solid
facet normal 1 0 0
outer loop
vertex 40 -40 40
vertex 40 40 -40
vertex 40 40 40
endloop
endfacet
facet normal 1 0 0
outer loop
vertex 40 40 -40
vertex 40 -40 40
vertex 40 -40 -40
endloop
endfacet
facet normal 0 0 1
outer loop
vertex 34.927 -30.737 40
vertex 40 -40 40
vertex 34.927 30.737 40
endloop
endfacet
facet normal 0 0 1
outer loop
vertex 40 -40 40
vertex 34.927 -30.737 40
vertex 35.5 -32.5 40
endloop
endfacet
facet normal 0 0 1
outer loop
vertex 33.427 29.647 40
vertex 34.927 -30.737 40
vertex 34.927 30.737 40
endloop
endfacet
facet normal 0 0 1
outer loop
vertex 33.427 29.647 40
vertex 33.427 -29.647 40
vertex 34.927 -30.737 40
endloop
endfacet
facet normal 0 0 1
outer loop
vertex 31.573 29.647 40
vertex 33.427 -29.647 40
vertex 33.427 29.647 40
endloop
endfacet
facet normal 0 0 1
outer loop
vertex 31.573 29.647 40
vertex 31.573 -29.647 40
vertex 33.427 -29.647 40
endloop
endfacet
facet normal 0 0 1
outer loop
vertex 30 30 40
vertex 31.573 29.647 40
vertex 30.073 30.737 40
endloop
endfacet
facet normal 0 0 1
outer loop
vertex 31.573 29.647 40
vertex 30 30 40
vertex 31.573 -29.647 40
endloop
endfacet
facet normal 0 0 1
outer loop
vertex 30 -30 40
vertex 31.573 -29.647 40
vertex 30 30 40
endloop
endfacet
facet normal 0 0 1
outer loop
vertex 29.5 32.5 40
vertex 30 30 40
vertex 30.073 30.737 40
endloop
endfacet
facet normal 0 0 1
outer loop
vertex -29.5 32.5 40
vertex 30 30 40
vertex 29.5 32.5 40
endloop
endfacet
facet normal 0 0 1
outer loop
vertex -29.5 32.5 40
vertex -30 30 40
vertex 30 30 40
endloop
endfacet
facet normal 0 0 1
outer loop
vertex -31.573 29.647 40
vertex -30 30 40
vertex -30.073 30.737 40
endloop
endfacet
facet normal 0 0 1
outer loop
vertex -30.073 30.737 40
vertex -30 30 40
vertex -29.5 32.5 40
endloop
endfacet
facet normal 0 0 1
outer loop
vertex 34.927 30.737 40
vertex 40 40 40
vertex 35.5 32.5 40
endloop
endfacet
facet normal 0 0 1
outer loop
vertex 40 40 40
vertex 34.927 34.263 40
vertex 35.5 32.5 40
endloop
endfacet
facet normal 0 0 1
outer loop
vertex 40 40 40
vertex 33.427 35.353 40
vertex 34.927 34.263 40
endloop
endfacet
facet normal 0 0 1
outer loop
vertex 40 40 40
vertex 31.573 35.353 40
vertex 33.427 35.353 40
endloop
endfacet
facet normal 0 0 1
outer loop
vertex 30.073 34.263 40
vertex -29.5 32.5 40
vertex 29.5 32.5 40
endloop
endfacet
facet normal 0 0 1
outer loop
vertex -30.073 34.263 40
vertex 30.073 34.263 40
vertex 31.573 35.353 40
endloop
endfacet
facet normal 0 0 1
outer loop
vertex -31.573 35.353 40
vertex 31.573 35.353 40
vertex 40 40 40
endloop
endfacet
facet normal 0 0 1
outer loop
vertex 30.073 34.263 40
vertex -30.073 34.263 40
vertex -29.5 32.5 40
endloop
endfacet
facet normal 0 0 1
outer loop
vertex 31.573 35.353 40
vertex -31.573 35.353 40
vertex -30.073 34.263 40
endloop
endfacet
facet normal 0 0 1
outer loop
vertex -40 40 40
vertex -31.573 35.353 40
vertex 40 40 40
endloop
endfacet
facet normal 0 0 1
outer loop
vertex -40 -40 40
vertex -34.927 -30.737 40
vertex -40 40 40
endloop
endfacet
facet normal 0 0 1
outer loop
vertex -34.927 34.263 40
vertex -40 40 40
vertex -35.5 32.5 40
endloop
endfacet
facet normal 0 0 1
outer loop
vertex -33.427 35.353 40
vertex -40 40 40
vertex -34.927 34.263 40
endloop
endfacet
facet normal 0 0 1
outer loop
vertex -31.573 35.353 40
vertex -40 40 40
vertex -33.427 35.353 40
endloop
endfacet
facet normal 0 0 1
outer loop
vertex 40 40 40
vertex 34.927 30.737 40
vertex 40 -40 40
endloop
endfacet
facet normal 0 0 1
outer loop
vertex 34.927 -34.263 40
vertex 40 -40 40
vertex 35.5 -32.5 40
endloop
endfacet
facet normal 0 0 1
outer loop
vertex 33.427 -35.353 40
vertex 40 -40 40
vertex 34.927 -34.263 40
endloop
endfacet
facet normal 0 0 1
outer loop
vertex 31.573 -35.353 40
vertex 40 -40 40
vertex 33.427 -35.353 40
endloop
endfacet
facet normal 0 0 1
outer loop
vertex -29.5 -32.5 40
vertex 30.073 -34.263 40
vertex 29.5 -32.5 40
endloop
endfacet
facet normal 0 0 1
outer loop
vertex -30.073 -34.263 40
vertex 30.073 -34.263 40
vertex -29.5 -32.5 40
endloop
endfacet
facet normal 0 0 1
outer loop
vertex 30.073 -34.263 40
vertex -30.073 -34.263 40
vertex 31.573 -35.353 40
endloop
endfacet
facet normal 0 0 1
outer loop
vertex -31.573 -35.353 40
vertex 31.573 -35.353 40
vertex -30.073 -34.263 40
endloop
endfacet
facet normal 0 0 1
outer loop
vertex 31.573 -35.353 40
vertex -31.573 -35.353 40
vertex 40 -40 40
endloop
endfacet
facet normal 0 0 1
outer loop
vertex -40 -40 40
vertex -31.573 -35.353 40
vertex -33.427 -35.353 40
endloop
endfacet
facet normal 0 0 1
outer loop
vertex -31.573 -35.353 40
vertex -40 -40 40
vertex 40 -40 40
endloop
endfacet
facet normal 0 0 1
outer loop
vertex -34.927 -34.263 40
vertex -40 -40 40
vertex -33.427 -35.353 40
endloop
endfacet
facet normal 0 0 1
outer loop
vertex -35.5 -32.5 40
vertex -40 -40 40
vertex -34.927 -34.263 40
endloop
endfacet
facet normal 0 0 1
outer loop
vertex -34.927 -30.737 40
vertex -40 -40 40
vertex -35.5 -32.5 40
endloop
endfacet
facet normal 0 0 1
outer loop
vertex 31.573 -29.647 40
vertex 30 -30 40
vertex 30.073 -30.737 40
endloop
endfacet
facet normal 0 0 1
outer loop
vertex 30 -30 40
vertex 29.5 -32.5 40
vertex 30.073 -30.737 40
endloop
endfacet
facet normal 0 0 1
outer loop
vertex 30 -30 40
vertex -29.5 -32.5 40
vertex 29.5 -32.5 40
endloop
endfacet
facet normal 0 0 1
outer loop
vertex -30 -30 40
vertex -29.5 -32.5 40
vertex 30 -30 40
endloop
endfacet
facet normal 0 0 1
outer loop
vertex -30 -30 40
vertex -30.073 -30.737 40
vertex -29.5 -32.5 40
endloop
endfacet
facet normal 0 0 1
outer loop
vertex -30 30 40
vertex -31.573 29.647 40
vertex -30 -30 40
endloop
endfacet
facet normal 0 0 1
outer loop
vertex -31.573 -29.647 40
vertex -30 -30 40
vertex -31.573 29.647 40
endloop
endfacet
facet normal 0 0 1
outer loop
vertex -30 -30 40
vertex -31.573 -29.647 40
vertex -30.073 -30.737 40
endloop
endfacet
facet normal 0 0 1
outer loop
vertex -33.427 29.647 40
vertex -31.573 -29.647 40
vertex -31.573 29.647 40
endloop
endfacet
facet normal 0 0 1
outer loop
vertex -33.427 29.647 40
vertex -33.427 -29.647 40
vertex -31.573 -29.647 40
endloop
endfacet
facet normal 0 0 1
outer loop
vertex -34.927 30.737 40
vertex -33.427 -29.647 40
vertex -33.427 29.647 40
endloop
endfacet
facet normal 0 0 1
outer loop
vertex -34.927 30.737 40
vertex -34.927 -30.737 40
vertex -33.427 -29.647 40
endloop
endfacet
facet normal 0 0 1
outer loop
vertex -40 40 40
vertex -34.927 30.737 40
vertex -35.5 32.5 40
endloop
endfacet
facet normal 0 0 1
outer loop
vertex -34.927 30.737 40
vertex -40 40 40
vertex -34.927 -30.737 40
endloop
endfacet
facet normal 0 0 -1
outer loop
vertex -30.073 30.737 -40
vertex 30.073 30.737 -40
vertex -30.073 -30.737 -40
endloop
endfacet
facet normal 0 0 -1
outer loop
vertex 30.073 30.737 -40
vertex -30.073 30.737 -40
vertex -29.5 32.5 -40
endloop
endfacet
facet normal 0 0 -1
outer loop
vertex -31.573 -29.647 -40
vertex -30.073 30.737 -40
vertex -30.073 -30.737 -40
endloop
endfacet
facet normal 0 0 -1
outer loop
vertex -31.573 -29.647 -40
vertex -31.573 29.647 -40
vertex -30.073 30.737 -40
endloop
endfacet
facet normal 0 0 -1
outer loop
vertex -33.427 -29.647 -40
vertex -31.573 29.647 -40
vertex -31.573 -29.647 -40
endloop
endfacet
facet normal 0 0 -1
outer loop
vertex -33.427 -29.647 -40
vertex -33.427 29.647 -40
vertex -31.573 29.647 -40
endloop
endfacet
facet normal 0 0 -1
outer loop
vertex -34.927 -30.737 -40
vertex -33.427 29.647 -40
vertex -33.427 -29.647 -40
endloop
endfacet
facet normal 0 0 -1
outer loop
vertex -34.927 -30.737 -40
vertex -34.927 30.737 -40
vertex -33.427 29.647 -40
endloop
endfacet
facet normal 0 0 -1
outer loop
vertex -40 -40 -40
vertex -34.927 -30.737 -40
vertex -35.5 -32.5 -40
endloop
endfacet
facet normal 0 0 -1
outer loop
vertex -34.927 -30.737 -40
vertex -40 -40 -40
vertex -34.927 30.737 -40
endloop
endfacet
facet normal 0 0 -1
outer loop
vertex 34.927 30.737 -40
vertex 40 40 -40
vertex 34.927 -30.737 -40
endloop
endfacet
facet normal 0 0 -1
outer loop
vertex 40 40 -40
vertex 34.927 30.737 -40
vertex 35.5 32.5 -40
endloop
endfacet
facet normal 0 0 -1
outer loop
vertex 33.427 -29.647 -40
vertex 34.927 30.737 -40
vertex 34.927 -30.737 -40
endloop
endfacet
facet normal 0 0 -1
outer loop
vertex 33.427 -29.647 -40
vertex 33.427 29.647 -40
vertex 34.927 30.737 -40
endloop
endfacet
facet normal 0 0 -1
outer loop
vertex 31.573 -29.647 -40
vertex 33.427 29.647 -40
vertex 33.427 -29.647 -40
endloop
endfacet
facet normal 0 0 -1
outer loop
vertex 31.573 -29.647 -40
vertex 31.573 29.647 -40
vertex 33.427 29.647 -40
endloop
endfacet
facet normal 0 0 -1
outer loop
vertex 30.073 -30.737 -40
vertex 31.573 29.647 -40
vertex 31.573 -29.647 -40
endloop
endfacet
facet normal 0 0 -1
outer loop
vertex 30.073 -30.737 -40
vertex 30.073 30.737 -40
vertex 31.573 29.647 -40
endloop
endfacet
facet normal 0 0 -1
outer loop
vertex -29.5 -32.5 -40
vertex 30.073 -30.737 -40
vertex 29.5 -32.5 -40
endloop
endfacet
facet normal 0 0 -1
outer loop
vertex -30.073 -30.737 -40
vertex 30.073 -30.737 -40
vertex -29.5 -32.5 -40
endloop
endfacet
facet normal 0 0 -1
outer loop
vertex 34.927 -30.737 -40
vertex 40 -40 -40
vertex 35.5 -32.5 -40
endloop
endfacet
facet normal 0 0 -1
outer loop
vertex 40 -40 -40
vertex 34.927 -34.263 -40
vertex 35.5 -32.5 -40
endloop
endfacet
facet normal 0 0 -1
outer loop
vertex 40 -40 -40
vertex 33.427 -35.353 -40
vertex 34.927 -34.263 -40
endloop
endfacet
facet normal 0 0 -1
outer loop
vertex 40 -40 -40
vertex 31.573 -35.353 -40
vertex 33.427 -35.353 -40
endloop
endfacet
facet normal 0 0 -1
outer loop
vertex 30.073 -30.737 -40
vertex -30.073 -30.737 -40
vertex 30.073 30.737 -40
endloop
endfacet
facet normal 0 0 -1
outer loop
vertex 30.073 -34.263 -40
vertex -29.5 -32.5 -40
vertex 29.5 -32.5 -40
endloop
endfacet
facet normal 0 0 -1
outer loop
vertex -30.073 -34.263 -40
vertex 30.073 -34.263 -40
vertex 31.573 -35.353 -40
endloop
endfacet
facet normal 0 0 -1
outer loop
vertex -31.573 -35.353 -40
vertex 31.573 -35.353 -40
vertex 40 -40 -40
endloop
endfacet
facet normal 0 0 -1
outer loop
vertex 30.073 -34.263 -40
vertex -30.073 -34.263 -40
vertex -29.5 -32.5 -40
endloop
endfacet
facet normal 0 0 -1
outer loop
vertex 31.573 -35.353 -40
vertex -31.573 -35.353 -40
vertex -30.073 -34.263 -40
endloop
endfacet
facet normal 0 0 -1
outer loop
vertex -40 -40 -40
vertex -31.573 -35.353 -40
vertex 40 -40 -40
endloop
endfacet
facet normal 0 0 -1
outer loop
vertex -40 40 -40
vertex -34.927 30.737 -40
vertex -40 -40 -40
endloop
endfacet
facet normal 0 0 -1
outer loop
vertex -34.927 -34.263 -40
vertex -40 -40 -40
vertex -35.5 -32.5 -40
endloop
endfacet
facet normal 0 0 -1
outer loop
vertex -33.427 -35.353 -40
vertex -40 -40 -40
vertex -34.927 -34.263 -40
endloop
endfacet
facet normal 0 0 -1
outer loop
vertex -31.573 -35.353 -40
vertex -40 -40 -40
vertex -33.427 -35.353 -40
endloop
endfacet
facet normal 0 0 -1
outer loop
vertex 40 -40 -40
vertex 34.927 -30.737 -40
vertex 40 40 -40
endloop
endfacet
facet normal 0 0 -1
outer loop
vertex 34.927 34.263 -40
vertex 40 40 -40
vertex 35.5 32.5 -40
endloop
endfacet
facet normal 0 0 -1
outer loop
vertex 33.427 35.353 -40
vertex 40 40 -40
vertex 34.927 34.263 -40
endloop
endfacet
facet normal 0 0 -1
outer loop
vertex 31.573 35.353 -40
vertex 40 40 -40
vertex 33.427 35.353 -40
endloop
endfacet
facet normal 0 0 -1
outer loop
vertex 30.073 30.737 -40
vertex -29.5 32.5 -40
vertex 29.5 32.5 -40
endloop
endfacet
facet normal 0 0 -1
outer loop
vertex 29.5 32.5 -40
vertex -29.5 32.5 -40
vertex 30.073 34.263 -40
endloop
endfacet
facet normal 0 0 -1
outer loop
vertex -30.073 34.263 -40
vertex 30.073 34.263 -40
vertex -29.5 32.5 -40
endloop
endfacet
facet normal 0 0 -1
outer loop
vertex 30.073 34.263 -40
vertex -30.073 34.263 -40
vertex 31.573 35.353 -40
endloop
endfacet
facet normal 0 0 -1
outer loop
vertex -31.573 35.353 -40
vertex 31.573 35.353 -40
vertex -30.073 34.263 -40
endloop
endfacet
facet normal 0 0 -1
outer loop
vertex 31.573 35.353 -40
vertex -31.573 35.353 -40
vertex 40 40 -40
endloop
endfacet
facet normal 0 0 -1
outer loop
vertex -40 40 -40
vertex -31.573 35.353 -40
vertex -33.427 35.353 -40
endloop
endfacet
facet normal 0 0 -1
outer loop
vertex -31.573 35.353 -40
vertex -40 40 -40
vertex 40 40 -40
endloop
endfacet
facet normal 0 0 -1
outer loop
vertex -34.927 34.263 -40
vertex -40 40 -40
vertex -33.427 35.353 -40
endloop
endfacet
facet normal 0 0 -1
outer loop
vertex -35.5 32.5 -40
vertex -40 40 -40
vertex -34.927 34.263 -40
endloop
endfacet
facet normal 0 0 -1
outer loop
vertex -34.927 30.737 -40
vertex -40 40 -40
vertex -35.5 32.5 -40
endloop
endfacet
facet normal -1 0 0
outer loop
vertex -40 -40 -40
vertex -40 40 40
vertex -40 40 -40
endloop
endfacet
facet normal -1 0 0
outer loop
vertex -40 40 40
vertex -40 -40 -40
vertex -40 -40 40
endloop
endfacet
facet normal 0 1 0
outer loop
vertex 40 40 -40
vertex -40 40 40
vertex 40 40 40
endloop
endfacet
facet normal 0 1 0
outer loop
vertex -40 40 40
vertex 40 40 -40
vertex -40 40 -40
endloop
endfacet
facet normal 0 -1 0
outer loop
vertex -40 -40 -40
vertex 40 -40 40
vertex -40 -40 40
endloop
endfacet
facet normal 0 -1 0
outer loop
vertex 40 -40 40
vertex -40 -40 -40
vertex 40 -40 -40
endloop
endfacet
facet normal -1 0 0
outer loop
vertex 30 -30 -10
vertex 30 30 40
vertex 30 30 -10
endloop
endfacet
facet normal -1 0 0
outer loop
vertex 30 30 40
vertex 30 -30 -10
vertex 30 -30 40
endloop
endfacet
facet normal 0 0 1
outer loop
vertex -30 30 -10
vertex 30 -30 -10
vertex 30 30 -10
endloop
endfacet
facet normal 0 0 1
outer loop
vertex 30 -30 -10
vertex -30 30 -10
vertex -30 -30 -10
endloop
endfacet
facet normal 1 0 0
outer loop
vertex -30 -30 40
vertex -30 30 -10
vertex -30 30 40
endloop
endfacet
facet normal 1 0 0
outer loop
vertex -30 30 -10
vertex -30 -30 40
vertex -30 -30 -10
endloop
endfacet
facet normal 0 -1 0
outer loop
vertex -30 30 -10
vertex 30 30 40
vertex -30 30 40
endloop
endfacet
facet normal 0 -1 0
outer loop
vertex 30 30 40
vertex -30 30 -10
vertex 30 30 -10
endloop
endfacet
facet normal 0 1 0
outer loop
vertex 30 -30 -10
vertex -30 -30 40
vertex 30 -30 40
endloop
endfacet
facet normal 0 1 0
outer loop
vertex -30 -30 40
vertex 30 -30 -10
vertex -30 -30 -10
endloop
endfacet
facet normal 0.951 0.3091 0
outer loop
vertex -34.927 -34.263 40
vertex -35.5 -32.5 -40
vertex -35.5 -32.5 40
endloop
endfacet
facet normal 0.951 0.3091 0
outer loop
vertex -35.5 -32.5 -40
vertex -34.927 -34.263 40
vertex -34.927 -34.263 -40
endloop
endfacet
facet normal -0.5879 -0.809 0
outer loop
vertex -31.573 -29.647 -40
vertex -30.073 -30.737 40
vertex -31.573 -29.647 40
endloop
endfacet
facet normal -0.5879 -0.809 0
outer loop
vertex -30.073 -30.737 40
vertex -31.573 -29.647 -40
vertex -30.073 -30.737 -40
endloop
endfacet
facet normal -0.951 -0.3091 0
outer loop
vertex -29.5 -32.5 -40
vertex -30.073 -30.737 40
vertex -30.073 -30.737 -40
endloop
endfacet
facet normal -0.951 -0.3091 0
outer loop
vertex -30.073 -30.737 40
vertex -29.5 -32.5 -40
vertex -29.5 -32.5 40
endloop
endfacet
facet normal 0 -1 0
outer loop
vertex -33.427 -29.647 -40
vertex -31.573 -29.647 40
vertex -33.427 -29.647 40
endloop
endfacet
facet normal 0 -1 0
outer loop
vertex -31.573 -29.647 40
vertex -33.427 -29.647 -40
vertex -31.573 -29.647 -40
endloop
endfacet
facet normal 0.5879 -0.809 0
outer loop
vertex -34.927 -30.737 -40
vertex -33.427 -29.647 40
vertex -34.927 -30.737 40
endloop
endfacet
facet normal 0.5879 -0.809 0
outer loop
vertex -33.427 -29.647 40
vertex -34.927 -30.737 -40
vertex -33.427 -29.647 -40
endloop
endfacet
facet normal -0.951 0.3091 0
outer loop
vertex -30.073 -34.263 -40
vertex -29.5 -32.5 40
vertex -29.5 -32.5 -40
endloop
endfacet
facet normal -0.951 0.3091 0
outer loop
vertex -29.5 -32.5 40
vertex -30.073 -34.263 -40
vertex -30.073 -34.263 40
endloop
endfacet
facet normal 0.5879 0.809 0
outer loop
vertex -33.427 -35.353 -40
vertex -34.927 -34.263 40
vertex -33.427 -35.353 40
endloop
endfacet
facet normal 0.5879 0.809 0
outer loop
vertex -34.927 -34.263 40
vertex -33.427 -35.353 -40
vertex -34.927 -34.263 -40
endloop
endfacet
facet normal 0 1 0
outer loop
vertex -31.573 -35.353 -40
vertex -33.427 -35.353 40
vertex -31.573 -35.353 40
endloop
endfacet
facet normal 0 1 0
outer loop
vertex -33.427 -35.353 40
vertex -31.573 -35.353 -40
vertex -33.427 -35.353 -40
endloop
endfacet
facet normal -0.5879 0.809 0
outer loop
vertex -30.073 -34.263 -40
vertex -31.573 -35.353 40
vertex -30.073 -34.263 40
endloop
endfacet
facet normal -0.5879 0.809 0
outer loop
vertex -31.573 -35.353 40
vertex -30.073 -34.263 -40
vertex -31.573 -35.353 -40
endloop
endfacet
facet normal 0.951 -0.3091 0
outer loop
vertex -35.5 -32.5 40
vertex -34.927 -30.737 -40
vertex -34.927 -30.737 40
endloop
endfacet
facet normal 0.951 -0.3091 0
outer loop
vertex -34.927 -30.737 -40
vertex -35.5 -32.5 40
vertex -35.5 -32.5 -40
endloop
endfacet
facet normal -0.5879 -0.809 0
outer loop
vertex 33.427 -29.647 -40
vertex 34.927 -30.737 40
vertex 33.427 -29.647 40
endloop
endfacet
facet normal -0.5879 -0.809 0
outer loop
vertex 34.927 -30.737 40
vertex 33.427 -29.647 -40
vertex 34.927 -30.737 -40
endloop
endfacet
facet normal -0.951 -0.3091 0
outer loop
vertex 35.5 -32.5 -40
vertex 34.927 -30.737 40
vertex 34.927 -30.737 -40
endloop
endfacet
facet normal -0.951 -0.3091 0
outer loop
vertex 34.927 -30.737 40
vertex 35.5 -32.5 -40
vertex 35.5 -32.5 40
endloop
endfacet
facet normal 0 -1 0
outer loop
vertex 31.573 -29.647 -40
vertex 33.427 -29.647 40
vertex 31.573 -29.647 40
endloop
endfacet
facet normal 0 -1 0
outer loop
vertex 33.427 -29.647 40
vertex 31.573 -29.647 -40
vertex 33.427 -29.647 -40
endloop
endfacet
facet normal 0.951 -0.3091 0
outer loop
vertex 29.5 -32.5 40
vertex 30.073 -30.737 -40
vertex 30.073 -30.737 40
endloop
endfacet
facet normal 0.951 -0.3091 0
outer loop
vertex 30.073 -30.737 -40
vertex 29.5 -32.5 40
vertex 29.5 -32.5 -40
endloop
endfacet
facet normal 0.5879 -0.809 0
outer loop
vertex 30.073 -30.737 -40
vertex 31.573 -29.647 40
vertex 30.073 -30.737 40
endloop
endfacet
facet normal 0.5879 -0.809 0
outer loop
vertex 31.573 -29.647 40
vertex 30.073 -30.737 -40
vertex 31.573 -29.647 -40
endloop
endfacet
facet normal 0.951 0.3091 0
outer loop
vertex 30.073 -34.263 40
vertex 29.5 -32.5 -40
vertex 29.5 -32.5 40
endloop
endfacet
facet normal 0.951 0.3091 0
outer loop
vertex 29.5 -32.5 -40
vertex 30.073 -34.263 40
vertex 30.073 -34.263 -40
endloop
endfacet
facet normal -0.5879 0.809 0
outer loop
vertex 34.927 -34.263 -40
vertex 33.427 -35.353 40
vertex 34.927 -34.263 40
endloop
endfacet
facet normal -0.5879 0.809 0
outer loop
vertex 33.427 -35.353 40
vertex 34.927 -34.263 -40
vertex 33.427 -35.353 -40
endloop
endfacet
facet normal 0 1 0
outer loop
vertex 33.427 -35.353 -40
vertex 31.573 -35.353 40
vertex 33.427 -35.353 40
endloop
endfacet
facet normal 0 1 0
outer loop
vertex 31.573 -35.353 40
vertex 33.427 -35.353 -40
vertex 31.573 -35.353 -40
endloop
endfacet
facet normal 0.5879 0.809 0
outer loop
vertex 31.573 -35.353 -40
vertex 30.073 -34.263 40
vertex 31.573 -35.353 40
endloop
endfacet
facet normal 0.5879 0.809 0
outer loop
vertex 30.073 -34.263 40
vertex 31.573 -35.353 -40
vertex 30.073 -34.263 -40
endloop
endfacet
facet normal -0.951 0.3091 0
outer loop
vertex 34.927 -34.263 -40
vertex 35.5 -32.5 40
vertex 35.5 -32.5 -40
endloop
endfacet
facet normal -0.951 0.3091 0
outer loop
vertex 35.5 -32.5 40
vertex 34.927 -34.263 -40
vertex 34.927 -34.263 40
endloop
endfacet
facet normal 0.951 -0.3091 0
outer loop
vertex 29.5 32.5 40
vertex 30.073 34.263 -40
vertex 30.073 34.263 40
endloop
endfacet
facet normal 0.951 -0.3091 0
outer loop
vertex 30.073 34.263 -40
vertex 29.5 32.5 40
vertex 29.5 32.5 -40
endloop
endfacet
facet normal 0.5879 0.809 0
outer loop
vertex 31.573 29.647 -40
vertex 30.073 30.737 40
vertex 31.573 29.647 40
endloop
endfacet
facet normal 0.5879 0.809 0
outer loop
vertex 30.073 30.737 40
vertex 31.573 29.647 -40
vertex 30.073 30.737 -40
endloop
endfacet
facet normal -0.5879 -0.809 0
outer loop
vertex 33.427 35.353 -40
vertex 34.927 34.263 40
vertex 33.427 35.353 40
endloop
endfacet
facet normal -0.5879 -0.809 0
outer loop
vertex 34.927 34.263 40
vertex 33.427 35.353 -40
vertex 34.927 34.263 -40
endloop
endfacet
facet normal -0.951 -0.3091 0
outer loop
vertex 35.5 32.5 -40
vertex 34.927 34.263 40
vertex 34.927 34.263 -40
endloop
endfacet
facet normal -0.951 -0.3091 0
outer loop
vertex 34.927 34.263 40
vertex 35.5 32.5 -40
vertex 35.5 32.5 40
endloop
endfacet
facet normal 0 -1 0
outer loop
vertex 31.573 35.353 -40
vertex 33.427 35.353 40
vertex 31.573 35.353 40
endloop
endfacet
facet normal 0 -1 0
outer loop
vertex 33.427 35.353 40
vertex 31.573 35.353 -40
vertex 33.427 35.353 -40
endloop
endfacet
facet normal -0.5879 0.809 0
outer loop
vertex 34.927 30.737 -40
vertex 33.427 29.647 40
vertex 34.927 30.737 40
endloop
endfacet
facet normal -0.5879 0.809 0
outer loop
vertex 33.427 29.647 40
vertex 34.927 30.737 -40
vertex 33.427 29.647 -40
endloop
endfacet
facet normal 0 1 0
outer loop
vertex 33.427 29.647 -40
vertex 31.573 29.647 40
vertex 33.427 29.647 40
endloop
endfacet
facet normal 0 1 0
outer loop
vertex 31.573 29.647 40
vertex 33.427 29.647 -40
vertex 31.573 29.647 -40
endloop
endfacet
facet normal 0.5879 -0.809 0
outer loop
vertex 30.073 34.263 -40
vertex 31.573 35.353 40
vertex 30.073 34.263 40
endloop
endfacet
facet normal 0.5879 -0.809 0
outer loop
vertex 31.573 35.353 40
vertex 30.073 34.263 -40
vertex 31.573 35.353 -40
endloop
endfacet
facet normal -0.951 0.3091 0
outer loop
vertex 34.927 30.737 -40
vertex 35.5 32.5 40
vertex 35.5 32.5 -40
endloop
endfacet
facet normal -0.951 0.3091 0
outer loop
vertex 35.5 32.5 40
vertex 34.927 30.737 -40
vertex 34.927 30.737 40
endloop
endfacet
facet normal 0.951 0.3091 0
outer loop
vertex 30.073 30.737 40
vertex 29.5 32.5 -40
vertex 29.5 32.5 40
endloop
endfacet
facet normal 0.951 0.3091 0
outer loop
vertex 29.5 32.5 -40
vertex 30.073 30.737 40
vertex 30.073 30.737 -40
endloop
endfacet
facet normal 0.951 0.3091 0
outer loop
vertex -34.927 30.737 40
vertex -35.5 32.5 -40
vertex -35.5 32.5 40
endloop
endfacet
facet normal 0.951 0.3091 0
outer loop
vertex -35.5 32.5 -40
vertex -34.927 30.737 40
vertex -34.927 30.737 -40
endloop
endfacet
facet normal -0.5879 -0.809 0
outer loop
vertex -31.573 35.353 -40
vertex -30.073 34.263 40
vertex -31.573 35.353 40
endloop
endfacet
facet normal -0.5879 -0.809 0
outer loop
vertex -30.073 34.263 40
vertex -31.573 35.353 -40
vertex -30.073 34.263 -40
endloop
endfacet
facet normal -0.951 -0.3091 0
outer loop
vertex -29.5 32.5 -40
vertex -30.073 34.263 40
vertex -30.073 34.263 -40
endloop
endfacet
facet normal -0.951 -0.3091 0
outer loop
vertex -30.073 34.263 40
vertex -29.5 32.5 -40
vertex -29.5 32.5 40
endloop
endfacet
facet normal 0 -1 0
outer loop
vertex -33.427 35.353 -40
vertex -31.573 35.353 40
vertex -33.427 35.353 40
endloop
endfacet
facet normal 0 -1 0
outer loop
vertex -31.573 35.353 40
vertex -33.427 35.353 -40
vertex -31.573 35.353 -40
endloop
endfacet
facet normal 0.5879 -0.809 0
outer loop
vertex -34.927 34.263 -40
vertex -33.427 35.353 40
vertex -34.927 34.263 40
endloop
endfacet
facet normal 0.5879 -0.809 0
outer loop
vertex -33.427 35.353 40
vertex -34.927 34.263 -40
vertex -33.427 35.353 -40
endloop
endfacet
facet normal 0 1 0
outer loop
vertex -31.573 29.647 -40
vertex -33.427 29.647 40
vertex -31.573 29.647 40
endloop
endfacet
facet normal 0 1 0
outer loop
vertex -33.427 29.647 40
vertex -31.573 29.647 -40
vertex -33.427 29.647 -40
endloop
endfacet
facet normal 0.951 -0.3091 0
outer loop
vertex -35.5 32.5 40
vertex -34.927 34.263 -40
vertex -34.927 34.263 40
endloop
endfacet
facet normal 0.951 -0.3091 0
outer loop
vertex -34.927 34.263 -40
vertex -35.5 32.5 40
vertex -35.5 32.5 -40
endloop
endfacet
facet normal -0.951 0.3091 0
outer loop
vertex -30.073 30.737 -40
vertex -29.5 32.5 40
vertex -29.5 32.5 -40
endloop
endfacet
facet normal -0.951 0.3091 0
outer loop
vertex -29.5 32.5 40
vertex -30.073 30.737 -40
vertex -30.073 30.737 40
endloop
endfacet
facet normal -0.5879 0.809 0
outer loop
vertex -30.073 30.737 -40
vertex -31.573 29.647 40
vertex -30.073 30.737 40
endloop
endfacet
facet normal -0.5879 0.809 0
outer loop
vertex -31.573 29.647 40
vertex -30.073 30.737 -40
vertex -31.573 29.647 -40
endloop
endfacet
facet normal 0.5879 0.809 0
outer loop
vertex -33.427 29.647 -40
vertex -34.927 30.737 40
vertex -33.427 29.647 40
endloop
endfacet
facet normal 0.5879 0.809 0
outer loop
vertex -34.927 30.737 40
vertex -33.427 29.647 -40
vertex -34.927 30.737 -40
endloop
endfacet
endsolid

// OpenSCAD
// ~/.cabal/bin/extopenscad 2.escad

$res=0.5;
difference(r=3){
	cube(size = [80,80,80], center = true, r = 2);
	translate([0,0,20])  
	cube(size = [60,60,60], center = true, r = 10.0);
	translate([-32.5,-32.5,0])  
	cylinder(r=3, h=200, center=true);
	translate([32.5,-32.5,0])  
	cylinder(r=3, h=200, center=true);
	translate([32.5,32.5,0])  
	cylinder(r=3, h=200, center=true);
	translate([-32.5,32.5,0])  
	cylinder(r=3, h=200, center=true);
}
